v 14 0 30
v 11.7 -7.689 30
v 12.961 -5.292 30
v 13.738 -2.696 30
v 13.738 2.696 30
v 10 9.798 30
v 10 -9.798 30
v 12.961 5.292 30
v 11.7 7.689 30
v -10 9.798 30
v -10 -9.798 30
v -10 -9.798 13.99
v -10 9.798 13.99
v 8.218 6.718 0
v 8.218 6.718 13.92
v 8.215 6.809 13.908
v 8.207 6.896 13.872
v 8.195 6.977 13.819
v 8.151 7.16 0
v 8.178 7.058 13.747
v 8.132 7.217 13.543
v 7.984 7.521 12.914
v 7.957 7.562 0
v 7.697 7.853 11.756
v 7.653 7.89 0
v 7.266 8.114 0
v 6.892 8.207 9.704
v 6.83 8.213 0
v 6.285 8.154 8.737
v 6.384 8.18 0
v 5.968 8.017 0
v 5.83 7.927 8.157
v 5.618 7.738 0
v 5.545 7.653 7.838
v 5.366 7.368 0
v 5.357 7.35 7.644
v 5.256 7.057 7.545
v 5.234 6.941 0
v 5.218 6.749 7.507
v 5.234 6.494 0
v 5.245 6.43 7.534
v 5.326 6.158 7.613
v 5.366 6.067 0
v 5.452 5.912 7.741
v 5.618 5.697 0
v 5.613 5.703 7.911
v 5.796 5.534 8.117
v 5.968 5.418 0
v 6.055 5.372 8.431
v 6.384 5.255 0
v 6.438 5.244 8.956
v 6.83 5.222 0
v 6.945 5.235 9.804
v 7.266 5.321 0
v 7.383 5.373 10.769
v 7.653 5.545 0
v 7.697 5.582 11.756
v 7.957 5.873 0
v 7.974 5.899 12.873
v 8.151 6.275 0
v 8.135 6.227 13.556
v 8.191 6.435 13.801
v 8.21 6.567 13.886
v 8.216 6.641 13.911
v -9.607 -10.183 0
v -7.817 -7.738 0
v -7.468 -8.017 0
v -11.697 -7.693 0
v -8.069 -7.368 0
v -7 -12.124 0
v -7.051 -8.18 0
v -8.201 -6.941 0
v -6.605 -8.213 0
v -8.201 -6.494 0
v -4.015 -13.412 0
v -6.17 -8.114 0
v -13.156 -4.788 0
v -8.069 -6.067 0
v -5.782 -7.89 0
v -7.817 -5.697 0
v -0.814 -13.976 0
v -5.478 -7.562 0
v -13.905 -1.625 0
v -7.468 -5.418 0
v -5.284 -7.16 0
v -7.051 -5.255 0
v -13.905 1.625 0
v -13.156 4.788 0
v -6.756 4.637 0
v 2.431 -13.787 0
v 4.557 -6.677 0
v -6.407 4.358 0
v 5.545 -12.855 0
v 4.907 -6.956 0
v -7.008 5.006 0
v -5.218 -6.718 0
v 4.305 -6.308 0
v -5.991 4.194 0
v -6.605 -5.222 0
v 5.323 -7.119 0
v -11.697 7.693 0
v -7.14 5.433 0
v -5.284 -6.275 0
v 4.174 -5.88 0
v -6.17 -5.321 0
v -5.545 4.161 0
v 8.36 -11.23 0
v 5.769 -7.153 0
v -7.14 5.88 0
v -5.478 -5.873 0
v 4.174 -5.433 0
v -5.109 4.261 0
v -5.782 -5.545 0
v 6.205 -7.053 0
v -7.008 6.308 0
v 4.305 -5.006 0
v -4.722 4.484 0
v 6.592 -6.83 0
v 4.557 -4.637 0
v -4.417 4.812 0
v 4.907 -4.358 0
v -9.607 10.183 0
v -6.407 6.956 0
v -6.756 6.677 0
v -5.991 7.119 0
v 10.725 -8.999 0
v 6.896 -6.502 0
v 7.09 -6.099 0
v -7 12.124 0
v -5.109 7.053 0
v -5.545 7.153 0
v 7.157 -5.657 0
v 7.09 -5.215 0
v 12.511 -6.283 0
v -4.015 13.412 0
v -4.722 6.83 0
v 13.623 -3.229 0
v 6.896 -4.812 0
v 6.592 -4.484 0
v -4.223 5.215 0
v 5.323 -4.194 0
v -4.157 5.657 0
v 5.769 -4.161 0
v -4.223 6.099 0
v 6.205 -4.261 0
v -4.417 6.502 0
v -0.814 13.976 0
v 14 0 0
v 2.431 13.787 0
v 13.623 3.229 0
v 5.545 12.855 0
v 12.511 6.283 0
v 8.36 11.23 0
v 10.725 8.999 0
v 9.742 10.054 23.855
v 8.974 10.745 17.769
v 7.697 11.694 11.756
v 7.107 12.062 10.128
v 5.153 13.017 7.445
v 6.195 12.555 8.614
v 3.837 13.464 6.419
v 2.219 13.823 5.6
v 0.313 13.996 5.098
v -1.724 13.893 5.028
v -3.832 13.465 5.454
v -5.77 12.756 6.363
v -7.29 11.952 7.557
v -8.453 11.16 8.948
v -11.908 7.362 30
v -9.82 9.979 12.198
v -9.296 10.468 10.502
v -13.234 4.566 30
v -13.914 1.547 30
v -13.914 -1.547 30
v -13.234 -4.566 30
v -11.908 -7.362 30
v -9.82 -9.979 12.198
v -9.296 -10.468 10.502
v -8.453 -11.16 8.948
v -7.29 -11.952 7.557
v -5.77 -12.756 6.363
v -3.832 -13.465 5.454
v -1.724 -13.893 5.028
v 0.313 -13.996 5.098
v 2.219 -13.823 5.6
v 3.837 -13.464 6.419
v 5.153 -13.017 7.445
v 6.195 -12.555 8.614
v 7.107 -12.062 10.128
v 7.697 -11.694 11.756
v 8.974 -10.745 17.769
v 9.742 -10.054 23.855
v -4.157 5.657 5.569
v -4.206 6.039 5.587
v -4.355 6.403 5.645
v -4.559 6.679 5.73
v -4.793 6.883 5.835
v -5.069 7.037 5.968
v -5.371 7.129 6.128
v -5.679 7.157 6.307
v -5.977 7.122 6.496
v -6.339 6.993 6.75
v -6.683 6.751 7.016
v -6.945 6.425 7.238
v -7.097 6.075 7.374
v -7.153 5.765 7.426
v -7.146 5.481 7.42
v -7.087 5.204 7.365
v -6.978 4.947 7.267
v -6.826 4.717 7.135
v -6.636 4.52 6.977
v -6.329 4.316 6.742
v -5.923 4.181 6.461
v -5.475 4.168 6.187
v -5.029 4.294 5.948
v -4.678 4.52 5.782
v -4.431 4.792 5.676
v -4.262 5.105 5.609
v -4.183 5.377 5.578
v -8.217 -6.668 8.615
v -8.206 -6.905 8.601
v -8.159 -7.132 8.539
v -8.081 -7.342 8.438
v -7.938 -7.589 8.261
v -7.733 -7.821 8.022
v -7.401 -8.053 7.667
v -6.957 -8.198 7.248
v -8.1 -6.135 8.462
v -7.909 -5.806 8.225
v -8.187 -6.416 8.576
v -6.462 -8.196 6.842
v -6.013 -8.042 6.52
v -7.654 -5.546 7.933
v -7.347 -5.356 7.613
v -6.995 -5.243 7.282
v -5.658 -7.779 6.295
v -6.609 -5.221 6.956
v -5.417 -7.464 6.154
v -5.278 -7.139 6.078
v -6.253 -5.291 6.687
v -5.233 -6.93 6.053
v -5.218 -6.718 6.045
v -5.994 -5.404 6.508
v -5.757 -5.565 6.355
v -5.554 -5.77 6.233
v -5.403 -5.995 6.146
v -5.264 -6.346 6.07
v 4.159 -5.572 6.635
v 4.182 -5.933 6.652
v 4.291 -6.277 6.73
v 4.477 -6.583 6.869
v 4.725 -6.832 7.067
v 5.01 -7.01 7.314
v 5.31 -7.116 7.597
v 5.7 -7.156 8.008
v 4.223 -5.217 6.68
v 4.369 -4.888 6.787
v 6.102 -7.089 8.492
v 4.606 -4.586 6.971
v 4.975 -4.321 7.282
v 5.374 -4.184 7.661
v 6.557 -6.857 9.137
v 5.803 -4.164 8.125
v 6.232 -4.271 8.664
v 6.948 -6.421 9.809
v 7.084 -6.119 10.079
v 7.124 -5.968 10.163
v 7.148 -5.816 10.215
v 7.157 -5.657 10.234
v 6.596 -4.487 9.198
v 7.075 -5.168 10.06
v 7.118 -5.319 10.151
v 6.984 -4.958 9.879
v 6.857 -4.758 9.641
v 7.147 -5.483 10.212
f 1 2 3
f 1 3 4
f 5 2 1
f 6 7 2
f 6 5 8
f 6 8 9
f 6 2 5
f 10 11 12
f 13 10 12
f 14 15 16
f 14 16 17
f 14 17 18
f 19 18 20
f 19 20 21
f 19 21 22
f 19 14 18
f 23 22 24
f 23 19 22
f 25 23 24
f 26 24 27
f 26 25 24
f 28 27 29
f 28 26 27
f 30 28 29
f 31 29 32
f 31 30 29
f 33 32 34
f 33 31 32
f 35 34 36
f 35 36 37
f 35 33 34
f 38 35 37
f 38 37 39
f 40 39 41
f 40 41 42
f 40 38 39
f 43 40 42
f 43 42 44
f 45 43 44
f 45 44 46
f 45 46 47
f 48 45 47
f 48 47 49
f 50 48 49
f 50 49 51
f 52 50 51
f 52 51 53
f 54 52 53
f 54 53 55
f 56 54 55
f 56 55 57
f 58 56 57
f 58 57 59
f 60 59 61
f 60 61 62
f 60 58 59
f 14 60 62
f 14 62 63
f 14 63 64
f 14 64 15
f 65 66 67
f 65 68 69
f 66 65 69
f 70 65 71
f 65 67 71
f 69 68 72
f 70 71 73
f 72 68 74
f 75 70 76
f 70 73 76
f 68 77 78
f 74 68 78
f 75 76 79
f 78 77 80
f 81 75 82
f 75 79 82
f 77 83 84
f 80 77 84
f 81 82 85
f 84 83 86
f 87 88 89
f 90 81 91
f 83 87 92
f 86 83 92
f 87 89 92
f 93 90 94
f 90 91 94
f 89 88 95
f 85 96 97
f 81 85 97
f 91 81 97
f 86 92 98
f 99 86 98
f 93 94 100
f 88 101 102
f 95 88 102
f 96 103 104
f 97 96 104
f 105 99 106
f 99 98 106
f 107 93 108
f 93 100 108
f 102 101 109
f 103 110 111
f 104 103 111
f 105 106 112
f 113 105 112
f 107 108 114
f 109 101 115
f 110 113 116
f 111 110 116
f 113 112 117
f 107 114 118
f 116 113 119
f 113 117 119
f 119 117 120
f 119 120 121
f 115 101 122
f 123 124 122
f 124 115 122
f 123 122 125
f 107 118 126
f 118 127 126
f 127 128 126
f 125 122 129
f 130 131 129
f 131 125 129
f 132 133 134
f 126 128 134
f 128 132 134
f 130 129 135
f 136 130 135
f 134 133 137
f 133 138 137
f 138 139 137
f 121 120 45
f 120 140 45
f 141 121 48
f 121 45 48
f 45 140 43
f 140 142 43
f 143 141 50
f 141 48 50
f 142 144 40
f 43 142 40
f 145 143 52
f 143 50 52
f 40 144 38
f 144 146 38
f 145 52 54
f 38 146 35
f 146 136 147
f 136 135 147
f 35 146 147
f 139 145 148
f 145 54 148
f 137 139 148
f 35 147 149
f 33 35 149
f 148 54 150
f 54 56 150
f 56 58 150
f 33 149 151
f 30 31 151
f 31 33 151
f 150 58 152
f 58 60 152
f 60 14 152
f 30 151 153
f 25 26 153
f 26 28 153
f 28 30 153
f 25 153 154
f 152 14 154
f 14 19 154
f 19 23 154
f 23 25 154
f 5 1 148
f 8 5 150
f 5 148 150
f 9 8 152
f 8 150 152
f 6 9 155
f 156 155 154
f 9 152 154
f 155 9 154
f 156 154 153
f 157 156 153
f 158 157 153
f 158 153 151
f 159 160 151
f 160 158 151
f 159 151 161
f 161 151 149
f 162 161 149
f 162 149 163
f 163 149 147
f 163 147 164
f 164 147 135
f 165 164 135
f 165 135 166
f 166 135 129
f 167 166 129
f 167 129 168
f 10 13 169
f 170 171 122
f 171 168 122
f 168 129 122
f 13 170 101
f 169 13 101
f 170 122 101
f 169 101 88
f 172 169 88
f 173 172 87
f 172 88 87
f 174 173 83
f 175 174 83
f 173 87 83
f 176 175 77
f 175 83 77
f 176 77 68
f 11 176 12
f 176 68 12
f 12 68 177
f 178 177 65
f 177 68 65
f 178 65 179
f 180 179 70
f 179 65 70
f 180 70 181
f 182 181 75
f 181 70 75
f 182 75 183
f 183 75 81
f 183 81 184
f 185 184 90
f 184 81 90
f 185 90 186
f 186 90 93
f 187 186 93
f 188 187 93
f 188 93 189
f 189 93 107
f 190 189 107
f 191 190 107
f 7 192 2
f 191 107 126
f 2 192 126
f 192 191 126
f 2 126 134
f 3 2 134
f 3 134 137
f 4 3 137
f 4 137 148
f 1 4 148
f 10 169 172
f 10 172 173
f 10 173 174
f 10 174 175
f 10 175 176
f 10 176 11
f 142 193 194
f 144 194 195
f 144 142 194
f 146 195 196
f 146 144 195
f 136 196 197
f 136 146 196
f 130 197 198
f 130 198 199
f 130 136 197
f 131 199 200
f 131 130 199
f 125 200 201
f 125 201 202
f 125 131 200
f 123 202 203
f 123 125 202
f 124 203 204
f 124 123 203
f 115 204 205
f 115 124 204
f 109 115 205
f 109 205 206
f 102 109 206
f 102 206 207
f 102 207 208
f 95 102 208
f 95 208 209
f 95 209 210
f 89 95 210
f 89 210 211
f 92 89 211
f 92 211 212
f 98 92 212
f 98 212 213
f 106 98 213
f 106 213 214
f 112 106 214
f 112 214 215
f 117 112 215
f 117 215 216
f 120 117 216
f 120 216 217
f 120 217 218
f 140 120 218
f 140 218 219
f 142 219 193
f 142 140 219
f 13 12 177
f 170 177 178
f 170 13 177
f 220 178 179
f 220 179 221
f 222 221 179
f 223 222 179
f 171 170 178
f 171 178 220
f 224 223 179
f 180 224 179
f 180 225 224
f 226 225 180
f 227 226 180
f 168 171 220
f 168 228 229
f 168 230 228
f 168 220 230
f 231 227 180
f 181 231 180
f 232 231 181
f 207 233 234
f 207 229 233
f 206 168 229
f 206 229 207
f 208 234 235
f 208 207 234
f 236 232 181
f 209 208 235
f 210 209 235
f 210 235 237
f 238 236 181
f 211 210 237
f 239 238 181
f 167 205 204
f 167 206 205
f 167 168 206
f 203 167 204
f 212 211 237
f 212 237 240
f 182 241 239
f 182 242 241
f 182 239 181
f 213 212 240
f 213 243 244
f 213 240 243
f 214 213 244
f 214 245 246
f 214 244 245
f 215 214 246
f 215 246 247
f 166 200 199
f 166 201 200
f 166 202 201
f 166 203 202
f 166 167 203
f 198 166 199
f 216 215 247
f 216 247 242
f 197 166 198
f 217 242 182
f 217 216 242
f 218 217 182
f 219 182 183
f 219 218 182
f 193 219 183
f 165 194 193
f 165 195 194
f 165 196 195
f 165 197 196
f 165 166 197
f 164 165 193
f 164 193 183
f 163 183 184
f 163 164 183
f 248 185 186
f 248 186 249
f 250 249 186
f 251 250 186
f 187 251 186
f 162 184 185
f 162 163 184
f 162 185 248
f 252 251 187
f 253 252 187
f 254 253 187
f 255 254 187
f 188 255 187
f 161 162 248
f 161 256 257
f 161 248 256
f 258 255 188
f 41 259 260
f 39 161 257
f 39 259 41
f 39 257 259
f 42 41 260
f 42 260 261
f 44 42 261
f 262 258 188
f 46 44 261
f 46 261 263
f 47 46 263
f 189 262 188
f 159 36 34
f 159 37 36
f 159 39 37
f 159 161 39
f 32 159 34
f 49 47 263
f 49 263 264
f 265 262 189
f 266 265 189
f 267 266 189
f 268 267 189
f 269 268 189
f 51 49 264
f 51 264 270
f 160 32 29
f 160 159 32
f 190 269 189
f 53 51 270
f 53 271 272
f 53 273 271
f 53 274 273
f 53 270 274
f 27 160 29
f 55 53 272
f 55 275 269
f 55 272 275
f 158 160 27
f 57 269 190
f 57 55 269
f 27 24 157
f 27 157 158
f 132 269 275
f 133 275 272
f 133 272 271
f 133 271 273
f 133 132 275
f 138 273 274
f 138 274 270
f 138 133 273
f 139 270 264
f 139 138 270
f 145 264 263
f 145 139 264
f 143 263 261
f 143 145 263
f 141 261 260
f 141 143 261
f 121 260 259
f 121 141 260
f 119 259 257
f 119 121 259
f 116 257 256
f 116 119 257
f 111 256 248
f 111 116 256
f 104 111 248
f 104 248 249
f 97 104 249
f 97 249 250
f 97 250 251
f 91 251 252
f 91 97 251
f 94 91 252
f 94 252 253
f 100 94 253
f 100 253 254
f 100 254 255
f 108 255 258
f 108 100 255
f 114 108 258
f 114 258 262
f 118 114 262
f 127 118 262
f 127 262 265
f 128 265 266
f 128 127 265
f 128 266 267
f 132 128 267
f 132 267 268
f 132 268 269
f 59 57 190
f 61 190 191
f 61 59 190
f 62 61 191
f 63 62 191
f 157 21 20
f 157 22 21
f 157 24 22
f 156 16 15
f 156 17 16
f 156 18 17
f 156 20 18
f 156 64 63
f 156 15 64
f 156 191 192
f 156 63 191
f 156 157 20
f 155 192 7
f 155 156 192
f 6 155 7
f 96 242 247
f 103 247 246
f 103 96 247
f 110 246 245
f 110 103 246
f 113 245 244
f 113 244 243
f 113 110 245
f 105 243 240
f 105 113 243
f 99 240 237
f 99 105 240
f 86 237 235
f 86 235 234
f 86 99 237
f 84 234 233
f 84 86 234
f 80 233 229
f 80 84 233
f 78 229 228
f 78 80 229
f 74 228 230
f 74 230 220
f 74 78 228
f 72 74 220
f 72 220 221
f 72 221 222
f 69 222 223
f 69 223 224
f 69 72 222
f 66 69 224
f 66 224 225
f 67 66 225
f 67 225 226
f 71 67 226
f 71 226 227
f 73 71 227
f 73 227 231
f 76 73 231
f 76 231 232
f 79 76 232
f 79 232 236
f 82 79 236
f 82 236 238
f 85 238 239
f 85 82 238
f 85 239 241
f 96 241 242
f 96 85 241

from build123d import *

# Parameters (mm, degrees)
F0_R          = 14
F0_R_2        = 1.5
F1_DEPTH      = 30
F3_DEPTH      = 25
F3_DEPTH_BACK = 25


with BuildPart() as f1:
    # F0 (on Top) → F1 (new body)
    with BuildSketch(Plane.XY):
        Circle(F0_R)
        with Locations((-6.7175144213, -6.7175144213)):
            Circle(F0_R_2, mode=Mode.SUBTRACT)
        with Locations((5.6568542495, -5.6568542495)):
            Circle(F0_R_2, mode=Mode.SUBTRACT)
        with Locations((-5.6568542495, 5.6568542495)):
            Circle(F0_R_2, mode=Mode.SUBTRACT)
        with Locations((6.7175144213, 6.7175144213)):
            Circle(F0_R_2, mode=Mode.SUBTRACT)
    extrude(amount=F1_DEPTH)

    # F2 (on Front) → F3 (cut, two sides)
    with BuildSketch(Plane.XZ) as f3_sk:
        with BuildLine():
            Line((10, 30), (-10, 30))
            Line((-10, 30), (-10, 13.9895361748))
            ThreePointArc((-10, 13.9895361748), (-2.136238911, 5.0707699432), (7.6971068467, 11.7557112868))
            ThreePointArc((7.6971068467, 11.7557112868), (9.4220015712, 20.8054719055), (10, 30))
        make_face()
    extrude(amount=-F3_DEPTH, mode=Mode.SUBTRACT)
    extrude(f3_sk.sketch, amount=F3_DEPTH_BACK, mode=Mode.SUBTRACT)


solid = f1.part
